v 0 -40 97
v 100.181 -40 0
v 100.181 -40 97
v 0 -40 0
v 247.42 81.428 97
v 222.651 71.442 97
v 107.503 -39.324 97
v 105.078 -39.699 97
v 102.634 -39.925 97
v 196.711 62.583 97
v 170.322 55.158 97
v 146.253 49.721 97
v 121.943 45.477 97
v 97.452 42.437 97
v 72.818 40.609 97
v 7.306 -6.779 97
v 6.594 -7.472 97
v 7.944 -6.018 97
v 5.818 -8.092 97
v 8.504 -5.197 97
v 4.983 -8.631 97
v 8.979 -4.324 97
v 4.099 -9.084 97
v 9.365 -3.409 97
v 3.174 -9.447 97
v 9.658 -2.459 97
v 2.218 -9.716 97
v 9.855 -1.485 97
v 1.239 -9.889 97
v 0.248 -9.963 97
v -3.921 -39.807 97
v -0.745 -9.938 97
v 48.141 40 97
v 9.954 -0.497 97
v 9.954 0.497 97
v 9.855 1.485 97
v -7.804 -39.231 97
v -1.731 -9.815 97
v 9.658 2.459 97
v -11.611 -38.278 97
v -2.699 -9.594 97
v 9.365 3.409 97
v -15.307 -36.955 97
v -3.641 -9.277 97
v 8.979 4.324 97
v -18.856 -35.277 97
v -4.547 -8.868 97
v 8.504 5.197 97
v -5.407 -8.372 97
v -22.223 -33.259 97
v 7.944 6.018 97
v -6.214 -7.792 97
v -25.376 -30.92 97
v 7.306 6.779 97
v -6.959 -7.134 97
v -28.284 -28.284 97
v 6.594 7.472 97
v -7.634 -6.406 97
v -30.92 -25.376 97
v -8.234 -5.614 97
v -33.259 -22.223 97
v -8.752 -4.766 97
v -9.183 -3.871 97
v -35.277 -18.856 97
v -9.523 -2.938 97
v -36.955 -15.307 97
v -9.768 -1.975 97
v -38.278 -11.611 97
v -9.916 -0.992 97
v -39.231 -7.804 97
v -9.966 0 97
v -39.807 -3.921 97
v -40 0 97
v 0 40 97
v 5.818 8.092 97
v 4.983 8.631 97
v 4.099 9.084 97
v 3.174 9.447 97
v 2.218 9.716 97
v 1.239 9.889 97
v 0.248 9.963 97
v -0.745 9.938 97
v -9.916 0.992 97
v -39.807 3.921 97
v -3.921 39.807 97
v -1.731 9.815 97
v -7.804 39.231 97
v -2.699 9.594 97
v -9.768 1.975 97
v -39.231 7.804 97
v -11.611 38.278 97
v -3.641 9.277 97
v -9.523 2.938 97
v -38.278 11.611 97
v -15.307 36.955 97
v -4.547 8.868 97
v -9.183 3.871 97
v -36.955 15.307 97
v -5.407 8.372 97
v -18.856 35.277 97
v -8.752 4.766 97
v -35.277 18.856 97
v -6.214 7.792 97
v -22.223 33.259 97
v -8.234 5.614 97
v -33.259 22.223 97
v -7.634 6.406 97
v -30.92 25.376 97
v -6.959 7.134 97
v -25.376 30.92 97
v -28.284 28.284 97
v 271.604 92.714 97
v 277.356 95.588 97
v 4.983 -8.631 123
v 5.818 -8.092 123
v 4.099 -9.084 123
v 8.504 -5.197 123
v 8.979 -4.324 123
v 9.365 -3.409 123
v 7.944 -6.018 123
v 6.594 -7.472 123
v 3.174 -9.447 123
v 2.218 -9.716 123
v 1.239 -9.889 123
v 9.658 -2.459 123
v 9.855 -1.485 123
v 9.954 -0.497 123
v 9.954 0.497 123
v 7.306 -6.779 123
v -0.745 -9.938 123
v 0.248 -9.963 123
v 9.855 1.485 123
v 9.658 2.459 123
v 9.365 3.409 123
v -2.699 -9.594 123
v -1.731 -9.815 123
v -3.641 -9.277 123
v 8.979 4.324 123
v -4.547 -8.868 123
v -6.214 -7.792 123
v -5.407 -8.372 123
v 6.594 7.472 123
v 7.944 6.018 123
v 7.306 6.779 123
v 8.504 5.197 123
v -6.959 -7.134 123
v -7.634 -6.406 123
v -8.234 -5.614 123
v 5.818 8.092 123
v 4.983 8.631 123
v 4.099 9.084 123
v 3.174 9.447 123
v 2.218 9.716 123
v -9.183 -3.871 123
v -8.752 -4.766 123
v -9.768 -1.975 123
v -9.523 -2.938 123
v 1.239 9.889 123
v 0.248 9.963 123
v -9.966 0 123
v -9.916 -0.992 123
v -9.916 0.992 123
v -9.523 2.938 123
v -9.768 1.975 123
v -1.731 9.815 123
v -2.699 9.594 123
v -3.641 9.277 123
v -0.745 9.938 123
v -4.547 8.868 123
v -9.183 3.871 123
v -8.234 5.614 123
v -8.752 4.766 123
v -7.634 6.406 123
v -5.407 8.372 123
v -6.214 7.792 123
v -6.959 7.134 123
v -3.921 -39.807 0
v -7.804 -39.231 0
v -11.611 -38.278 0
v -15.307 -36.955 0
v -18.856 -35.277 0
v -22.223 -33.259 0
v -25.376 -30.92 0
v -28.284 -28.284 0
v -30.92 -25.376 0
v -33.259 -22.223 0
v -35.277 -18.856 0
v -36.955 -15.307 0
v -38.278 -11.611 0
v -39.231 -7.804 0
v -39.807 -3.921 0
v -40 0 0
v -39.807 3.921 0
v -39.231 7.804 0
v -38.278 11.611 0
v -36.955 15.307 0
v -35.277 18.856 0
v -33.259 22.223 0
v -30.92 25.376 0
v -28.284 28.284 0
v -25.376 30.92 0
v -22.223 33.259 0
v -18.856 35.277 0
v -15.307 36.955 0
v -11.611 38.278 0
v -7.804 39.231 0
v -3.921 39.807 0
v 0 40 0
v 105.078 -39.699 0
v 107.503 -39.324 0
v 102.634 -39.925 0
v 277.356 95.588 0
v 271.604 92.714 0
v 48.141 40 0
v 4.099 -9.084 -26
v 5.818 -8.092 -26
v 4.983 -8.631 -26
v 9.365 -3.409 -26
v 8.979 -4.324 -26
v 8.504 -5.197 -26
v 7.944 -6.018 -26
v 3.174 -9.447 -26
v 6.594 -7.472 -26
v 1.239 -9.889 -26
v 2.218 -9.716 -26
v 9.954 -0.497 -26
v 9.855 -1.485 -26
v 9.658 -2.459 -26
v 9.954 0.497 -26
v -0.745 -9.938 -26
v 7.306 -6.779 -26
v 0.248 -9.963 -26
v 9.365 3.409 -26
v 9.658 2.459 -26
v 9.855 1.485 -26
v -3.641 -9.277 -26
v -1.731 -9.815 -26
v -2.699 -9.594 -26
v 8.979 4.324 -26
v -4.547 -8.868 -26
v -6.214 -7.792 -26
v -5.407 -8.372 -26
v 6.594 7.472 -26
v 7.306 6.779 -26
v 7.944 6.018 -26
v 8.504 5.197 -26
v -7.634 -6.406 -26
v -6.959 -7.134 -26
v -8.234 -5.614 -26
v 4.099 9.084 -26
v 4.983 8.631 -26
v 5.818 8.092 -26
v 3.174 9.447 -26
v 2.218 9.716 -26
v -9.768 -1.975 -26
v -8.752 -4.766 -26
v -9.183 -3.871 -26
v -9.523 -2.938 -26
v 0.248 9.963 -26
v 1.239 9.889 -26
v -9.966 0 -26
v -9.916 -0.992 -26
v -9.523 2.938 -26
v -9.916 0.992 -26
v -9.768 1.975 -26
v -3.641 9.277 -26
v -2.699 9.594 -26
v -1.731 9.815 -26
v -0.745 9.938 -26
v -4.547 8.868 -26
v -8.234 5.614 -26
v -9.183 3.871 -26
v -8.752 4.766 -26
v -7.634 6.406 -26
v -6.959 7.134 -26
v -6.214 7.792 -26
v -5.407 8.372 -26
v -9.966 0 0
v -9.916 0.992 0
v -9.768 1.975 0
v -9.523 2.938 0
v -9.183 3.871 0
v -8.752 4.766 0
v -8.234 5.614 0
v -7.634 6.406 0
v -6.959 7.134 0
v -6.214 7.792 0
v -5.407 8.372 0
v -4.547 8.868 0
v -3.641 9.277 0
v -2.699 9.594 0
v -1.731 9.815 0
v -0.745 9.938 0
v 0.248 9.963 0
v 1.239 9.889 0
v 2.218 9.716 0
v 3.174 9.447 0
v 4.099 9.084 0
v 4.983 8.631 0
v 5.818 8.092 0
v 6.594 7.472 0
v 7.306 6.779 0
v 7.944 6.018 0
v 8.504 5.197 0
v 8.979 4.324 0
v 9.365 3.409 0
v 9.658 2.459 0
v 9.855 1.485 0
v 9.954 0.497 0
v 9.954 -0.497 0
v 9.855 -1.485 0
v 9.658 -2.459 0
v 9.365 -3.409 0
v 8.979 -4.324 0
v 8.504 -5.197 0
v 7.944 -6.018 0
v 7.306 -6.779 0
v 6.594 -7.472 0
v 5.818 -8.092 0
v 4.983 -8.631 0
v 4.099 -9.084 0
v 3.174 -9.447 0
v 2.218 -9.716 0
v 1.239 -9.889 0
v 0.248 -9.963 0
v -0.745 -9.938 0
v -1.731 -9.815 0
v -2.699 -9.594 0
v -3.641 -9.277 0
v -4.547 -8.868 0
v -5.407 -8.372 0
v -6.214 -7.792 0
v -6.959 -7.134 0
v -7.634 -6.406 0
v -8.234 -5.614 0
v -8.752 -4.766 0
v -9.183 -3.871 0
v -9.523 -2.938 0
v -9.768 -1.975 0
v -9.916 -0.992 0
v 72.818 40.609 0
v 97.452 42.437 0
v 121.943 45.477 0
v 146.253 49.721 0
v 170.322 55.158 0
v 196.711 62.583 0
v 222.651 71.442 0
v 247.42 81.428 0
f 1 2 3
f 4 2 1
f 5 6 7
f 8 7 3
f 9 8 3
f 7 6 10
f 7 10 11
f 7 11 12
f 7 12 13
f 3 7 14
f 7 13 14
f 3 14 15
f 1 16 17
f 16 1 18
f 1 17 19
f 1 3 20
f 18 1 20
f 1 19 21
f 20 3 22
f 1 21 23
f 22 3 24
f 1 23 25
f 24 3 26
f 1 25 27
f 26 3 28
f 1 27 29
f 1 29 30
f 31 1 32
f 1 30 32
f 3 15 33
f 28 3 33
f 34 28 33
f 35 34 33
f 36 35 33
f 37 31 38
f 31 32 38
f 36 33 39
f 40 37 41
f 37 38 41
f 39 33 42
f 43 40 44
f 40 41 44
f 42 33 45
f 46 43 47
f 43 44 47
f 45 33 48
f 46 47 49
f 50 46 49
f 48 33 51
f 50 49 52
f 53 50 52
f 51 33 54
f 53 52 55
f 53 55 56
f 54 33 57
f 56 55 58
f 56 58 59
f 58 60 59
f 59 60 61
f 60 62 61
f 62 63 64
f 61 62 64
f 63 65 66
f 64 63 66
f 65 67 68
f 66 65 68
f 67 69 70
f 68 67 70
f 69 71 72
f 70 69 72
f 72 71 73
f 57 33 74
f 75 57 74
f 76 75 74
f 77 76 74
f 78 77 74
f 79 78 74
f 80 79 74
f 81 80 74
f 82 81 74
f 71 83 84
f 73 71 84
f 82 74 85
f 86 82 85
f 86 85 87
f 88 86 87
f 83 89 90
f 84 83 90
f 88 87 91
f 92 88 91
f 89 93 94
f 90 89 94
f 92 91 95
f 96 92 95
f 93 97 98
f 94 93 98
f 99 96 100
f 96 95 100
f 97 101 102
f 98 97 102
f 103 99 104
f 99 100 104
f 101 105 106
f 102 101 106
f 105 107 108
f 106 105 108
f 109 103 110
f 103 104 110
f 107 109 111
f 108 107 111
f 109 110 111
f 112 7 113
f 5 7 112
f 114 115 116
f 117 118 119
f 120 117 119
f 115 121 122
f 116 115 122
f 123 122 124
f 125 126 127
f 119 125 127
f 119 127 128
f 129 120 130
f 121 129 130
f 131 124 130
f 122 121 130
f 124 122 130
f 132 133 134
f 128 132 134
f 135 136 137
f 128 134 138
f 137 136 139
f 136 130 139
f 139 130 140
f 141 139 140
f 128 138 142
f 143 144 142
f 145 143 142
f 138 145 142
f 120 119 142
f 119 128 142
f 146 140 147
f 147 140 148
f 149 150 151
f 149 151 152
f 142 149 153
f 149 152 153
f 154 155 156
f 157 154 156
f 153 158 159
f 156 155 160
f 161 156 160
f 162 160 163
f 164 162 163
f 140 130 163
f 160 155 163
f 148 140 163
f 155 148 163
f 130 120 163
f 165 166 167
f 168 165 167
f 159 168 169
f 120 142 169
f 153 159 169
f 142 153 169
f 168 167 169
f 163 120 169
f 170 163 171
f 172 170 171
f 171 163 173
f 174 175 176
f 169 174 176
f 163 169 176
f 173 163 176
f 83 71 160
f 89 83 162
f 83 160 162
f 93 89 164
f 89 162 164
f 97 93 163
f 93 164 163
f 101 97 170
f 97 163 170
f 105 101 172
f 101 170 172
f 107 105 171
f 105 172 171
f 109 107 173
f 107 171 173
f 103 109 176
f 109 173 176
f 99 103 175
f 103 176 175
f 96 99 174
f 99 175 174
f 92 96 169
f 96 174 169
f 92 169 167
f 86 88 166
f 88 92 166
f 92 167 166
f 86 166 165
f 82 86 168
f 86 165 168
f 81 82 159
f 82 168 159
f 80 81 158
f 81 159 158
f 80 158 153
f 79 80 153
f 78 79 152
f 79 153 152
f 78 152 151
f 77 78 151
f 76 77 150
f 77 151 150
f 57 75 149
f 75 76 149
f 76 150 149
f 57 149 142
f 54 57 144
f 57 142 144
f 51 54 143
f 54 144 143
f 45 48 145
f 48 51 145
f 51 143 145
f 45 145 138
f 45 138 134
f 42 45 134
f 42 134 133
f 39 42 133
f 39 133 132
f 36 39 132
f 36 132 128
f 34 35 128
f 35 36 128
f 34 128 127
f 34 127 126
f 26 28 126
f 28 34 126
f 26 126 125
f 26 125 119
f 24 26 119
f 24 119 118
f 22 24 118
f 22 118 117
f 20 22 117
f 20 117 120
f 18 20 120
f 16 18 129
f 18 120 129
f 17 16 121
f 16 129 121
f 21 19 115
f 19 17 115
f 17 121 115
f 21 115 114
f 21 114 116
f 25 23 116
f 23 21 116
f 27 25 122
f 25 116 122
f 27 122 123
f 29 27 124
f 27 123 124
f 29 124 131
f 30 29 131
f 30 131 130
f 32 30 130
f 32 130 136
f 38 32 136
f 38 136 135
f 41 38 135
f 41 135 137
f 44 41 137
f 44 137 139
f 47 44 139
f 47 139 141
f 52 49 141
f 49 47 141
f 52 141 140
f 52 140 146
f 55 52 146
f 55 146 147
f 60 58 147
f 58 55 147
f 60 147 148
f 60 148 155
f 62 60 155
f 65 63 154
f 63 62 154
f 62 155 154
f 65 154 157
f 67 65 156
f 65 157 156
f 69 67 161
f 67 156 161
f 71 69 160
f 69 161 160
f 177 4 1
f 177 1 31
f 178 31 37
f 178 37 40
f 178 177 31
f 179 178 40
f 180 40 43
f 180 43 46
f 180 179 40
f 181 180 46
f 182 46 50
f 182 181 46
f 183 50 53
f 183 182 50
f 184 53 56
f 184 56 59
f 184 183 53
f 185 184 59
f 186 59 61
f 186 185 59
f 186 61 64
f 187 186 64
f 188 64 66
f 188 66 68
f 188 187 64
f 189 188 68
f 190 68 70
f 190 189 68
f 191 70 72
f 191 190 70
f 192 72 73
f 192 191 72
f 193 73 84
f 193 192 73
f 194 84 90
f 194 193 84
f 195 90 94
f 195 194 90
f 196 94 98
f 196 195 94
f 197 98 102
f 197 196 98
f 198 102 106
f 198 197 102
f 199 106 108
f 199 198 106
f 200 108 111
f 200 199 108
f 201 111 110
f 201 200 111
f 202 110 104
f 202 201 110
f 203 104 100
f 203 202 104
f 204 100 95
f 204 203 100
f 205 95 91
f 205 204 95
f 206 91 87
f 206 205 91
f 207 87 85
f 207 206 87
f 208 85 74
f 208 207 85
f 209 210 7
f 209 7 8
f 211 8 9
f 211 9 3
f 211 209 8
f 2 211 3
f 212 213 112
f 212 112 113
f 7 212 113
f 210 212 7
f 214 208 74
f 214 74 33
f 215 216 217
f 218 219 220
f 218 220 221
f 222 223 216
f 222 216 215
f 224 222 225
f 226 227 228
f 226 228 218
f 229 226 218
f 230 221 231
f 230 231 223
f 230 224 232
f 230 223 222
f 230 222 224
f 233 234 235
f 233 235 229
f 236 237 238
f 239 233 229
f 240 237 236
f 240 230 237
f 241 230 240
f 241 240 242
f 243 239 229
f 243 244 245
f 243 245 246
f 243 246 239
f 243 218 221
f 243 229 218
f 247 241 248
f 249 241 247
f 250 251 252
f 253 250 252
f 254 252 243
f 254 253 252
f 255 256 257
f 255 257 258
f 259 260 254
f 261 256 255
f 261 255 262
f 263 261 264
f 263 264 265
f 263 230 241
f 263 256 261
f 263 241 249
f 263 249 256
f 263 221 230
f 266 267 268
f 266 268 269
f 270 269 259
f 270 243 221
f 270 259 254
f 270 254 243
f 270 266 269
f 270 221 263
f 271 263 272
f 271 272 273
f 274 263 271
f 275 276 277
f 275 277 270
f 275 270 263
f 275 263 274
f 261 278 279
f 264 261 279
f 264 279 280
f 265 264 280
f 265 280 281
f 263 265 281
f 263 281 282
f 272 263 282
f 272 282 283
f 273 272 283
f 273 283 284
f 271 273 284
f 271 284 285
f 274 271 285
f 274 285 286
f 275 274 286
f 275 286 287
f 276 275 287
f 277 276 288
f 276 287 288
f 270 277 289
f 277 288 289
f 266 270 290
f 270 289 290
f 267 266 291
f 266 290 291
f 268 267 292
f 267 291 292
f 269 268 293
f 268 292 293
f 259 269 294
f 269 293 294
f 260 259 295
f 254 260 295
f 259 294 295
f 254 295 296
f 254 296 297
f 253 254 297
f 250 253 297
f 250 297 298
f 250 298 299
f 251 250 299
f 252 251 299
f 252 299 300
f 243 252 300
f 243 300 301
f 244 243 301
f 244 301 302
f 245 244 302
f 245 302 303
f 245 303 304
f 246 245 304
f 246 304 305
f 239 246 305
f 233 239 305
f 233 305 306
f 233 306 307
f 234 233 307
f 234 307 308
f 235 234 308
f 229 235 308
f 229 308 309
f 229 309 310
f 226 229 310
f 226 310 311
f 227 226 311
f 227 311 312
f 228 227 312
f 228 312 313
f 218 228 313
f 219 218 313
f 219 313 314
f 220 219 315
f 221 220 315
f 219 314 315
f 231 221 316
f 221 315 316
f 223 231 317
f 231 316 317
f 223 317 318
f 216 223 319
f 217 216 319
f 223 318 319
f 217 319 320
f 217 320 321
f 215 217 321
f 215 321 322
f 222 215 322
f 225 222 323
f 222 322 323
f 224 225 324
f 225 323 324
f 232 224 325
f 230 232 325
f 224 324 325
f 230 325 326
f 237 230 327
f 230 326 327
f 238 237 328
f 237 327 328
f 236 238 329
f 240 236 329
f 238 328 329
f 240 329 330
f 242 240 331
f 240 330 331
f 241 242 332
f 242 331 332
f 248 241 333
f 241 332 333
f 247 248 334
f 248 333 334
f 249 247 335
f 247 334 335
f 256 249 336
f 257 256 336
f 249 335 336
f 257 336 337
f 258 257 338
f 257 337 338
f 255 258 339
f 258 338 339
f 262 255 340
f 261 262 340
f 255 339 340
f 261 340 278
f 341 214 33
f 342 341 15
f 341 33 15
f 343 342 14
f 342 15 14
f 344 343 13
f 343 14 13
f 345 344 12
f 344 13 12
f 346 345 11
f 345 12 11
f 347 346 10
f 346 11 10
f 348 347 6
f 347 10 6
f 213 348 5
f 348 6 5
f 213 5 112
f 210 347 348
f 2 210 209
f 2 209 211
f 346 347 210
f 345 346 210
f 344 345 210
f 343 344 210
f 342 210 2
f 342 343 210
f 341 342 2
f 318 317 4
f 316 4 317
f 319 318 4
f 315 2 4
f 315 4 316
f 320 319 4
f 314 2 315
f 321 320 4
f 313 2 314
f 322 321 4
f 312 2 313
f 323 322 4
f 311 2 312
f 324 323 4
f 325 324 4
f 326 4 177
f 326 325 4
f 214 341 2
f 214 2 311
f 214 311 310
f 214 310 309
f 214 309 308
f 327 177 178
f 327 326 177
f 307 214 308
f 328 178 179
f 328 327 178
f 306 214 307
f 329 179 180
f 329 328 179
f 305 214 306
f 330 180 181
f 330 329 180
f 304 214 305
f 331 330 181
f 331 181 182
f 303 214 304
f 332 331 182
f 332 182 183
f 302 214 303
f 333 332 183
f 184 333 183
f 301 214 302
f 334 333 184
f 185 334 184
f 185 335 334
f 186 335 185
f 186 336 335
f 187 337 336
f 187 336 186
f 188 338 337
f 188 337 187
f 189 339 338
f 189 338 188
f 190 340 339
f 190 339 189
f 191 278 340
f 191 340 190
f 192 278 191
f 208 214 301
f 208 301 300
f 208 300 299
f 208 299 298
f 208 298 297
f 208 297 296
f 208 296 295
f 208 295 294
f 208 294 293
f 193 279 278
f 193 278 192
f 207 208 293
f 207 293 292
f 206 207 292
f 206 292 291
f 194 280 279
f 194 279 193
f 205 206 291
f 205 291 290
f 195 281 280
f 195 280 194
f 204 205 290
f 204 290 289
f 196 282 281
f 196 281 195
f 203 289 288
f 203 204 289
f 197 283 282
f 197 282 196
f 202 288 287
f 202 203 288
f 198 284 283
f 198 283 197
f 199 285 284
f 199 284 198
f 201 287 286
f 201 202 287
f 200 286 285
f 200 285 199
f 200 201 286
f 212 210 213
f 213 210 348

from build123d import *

# Parameters (mm, degrees)
SALIENTE_EXTRUIR2_DEPTH      = 97
REDONDEO2_R                  = 500
SALIENTE_EXTRUIR3_DEPTH      = 26
SALIENTE_EXTRUIR3_DEPTH_BACK = 123
CROQUIS2_R                   = 9.966


with BuildPart() as part:
    # Croquis1 → Saliente-Extruir2 (new body)
    with BuildSketch(Plane.XY):
        with BuildLine():
            Line((0, 40), (100.180824208, 40))
            ThreePointArc((100.180824208, 40), (118.45024357, 35.584102014), (132.685868325, 23.311415808))
            Line((132.685868325, 23.311415808), (277.355906926, 95.588111944))
            Line((277.355906926, 95.588111944), (107.503389255, -39.324038973))
            ThreePointArc((107.503389255, -39.324038973), (103.857673476, -39.830651256), (100.180824208, -40))
            Line((100.180824208, -40), (0, -40))
            ThreePointArc((0, -40), (-40, 0), (0, 40))
        make_face()
    extrude(amount=SALIENTE_EXTRUIR2_DEPTH)

    # Redondeo2
    redondeo2_edges = [part.edges().sort_by_distance(p)[0] for p in [
        (132.685868325, 23.311415808, 48.5),
    ]]
    fillet(redondeo2_edges, radius=REDONDEO2_R)

    # Croquis2 → Saliente-Extruir3 (add, two sides: drawn at the far end of the back side and taken through both)
    with BuildSketch(Plane(origin=(0, 0, 0), x_dir=(-1, 0, 0), z_dir=(0, 0, -1)).offset(-SALIENTE_EXTRUIR3_DEPTH_BACK)):
        Circle(CROQUIS2_R)
    extrude(amount=SALIENTE_EXTRUIR3_DEPTH + SALIENTE_EXTRUIR3_DEPTH_BACK)


solid = part.part
